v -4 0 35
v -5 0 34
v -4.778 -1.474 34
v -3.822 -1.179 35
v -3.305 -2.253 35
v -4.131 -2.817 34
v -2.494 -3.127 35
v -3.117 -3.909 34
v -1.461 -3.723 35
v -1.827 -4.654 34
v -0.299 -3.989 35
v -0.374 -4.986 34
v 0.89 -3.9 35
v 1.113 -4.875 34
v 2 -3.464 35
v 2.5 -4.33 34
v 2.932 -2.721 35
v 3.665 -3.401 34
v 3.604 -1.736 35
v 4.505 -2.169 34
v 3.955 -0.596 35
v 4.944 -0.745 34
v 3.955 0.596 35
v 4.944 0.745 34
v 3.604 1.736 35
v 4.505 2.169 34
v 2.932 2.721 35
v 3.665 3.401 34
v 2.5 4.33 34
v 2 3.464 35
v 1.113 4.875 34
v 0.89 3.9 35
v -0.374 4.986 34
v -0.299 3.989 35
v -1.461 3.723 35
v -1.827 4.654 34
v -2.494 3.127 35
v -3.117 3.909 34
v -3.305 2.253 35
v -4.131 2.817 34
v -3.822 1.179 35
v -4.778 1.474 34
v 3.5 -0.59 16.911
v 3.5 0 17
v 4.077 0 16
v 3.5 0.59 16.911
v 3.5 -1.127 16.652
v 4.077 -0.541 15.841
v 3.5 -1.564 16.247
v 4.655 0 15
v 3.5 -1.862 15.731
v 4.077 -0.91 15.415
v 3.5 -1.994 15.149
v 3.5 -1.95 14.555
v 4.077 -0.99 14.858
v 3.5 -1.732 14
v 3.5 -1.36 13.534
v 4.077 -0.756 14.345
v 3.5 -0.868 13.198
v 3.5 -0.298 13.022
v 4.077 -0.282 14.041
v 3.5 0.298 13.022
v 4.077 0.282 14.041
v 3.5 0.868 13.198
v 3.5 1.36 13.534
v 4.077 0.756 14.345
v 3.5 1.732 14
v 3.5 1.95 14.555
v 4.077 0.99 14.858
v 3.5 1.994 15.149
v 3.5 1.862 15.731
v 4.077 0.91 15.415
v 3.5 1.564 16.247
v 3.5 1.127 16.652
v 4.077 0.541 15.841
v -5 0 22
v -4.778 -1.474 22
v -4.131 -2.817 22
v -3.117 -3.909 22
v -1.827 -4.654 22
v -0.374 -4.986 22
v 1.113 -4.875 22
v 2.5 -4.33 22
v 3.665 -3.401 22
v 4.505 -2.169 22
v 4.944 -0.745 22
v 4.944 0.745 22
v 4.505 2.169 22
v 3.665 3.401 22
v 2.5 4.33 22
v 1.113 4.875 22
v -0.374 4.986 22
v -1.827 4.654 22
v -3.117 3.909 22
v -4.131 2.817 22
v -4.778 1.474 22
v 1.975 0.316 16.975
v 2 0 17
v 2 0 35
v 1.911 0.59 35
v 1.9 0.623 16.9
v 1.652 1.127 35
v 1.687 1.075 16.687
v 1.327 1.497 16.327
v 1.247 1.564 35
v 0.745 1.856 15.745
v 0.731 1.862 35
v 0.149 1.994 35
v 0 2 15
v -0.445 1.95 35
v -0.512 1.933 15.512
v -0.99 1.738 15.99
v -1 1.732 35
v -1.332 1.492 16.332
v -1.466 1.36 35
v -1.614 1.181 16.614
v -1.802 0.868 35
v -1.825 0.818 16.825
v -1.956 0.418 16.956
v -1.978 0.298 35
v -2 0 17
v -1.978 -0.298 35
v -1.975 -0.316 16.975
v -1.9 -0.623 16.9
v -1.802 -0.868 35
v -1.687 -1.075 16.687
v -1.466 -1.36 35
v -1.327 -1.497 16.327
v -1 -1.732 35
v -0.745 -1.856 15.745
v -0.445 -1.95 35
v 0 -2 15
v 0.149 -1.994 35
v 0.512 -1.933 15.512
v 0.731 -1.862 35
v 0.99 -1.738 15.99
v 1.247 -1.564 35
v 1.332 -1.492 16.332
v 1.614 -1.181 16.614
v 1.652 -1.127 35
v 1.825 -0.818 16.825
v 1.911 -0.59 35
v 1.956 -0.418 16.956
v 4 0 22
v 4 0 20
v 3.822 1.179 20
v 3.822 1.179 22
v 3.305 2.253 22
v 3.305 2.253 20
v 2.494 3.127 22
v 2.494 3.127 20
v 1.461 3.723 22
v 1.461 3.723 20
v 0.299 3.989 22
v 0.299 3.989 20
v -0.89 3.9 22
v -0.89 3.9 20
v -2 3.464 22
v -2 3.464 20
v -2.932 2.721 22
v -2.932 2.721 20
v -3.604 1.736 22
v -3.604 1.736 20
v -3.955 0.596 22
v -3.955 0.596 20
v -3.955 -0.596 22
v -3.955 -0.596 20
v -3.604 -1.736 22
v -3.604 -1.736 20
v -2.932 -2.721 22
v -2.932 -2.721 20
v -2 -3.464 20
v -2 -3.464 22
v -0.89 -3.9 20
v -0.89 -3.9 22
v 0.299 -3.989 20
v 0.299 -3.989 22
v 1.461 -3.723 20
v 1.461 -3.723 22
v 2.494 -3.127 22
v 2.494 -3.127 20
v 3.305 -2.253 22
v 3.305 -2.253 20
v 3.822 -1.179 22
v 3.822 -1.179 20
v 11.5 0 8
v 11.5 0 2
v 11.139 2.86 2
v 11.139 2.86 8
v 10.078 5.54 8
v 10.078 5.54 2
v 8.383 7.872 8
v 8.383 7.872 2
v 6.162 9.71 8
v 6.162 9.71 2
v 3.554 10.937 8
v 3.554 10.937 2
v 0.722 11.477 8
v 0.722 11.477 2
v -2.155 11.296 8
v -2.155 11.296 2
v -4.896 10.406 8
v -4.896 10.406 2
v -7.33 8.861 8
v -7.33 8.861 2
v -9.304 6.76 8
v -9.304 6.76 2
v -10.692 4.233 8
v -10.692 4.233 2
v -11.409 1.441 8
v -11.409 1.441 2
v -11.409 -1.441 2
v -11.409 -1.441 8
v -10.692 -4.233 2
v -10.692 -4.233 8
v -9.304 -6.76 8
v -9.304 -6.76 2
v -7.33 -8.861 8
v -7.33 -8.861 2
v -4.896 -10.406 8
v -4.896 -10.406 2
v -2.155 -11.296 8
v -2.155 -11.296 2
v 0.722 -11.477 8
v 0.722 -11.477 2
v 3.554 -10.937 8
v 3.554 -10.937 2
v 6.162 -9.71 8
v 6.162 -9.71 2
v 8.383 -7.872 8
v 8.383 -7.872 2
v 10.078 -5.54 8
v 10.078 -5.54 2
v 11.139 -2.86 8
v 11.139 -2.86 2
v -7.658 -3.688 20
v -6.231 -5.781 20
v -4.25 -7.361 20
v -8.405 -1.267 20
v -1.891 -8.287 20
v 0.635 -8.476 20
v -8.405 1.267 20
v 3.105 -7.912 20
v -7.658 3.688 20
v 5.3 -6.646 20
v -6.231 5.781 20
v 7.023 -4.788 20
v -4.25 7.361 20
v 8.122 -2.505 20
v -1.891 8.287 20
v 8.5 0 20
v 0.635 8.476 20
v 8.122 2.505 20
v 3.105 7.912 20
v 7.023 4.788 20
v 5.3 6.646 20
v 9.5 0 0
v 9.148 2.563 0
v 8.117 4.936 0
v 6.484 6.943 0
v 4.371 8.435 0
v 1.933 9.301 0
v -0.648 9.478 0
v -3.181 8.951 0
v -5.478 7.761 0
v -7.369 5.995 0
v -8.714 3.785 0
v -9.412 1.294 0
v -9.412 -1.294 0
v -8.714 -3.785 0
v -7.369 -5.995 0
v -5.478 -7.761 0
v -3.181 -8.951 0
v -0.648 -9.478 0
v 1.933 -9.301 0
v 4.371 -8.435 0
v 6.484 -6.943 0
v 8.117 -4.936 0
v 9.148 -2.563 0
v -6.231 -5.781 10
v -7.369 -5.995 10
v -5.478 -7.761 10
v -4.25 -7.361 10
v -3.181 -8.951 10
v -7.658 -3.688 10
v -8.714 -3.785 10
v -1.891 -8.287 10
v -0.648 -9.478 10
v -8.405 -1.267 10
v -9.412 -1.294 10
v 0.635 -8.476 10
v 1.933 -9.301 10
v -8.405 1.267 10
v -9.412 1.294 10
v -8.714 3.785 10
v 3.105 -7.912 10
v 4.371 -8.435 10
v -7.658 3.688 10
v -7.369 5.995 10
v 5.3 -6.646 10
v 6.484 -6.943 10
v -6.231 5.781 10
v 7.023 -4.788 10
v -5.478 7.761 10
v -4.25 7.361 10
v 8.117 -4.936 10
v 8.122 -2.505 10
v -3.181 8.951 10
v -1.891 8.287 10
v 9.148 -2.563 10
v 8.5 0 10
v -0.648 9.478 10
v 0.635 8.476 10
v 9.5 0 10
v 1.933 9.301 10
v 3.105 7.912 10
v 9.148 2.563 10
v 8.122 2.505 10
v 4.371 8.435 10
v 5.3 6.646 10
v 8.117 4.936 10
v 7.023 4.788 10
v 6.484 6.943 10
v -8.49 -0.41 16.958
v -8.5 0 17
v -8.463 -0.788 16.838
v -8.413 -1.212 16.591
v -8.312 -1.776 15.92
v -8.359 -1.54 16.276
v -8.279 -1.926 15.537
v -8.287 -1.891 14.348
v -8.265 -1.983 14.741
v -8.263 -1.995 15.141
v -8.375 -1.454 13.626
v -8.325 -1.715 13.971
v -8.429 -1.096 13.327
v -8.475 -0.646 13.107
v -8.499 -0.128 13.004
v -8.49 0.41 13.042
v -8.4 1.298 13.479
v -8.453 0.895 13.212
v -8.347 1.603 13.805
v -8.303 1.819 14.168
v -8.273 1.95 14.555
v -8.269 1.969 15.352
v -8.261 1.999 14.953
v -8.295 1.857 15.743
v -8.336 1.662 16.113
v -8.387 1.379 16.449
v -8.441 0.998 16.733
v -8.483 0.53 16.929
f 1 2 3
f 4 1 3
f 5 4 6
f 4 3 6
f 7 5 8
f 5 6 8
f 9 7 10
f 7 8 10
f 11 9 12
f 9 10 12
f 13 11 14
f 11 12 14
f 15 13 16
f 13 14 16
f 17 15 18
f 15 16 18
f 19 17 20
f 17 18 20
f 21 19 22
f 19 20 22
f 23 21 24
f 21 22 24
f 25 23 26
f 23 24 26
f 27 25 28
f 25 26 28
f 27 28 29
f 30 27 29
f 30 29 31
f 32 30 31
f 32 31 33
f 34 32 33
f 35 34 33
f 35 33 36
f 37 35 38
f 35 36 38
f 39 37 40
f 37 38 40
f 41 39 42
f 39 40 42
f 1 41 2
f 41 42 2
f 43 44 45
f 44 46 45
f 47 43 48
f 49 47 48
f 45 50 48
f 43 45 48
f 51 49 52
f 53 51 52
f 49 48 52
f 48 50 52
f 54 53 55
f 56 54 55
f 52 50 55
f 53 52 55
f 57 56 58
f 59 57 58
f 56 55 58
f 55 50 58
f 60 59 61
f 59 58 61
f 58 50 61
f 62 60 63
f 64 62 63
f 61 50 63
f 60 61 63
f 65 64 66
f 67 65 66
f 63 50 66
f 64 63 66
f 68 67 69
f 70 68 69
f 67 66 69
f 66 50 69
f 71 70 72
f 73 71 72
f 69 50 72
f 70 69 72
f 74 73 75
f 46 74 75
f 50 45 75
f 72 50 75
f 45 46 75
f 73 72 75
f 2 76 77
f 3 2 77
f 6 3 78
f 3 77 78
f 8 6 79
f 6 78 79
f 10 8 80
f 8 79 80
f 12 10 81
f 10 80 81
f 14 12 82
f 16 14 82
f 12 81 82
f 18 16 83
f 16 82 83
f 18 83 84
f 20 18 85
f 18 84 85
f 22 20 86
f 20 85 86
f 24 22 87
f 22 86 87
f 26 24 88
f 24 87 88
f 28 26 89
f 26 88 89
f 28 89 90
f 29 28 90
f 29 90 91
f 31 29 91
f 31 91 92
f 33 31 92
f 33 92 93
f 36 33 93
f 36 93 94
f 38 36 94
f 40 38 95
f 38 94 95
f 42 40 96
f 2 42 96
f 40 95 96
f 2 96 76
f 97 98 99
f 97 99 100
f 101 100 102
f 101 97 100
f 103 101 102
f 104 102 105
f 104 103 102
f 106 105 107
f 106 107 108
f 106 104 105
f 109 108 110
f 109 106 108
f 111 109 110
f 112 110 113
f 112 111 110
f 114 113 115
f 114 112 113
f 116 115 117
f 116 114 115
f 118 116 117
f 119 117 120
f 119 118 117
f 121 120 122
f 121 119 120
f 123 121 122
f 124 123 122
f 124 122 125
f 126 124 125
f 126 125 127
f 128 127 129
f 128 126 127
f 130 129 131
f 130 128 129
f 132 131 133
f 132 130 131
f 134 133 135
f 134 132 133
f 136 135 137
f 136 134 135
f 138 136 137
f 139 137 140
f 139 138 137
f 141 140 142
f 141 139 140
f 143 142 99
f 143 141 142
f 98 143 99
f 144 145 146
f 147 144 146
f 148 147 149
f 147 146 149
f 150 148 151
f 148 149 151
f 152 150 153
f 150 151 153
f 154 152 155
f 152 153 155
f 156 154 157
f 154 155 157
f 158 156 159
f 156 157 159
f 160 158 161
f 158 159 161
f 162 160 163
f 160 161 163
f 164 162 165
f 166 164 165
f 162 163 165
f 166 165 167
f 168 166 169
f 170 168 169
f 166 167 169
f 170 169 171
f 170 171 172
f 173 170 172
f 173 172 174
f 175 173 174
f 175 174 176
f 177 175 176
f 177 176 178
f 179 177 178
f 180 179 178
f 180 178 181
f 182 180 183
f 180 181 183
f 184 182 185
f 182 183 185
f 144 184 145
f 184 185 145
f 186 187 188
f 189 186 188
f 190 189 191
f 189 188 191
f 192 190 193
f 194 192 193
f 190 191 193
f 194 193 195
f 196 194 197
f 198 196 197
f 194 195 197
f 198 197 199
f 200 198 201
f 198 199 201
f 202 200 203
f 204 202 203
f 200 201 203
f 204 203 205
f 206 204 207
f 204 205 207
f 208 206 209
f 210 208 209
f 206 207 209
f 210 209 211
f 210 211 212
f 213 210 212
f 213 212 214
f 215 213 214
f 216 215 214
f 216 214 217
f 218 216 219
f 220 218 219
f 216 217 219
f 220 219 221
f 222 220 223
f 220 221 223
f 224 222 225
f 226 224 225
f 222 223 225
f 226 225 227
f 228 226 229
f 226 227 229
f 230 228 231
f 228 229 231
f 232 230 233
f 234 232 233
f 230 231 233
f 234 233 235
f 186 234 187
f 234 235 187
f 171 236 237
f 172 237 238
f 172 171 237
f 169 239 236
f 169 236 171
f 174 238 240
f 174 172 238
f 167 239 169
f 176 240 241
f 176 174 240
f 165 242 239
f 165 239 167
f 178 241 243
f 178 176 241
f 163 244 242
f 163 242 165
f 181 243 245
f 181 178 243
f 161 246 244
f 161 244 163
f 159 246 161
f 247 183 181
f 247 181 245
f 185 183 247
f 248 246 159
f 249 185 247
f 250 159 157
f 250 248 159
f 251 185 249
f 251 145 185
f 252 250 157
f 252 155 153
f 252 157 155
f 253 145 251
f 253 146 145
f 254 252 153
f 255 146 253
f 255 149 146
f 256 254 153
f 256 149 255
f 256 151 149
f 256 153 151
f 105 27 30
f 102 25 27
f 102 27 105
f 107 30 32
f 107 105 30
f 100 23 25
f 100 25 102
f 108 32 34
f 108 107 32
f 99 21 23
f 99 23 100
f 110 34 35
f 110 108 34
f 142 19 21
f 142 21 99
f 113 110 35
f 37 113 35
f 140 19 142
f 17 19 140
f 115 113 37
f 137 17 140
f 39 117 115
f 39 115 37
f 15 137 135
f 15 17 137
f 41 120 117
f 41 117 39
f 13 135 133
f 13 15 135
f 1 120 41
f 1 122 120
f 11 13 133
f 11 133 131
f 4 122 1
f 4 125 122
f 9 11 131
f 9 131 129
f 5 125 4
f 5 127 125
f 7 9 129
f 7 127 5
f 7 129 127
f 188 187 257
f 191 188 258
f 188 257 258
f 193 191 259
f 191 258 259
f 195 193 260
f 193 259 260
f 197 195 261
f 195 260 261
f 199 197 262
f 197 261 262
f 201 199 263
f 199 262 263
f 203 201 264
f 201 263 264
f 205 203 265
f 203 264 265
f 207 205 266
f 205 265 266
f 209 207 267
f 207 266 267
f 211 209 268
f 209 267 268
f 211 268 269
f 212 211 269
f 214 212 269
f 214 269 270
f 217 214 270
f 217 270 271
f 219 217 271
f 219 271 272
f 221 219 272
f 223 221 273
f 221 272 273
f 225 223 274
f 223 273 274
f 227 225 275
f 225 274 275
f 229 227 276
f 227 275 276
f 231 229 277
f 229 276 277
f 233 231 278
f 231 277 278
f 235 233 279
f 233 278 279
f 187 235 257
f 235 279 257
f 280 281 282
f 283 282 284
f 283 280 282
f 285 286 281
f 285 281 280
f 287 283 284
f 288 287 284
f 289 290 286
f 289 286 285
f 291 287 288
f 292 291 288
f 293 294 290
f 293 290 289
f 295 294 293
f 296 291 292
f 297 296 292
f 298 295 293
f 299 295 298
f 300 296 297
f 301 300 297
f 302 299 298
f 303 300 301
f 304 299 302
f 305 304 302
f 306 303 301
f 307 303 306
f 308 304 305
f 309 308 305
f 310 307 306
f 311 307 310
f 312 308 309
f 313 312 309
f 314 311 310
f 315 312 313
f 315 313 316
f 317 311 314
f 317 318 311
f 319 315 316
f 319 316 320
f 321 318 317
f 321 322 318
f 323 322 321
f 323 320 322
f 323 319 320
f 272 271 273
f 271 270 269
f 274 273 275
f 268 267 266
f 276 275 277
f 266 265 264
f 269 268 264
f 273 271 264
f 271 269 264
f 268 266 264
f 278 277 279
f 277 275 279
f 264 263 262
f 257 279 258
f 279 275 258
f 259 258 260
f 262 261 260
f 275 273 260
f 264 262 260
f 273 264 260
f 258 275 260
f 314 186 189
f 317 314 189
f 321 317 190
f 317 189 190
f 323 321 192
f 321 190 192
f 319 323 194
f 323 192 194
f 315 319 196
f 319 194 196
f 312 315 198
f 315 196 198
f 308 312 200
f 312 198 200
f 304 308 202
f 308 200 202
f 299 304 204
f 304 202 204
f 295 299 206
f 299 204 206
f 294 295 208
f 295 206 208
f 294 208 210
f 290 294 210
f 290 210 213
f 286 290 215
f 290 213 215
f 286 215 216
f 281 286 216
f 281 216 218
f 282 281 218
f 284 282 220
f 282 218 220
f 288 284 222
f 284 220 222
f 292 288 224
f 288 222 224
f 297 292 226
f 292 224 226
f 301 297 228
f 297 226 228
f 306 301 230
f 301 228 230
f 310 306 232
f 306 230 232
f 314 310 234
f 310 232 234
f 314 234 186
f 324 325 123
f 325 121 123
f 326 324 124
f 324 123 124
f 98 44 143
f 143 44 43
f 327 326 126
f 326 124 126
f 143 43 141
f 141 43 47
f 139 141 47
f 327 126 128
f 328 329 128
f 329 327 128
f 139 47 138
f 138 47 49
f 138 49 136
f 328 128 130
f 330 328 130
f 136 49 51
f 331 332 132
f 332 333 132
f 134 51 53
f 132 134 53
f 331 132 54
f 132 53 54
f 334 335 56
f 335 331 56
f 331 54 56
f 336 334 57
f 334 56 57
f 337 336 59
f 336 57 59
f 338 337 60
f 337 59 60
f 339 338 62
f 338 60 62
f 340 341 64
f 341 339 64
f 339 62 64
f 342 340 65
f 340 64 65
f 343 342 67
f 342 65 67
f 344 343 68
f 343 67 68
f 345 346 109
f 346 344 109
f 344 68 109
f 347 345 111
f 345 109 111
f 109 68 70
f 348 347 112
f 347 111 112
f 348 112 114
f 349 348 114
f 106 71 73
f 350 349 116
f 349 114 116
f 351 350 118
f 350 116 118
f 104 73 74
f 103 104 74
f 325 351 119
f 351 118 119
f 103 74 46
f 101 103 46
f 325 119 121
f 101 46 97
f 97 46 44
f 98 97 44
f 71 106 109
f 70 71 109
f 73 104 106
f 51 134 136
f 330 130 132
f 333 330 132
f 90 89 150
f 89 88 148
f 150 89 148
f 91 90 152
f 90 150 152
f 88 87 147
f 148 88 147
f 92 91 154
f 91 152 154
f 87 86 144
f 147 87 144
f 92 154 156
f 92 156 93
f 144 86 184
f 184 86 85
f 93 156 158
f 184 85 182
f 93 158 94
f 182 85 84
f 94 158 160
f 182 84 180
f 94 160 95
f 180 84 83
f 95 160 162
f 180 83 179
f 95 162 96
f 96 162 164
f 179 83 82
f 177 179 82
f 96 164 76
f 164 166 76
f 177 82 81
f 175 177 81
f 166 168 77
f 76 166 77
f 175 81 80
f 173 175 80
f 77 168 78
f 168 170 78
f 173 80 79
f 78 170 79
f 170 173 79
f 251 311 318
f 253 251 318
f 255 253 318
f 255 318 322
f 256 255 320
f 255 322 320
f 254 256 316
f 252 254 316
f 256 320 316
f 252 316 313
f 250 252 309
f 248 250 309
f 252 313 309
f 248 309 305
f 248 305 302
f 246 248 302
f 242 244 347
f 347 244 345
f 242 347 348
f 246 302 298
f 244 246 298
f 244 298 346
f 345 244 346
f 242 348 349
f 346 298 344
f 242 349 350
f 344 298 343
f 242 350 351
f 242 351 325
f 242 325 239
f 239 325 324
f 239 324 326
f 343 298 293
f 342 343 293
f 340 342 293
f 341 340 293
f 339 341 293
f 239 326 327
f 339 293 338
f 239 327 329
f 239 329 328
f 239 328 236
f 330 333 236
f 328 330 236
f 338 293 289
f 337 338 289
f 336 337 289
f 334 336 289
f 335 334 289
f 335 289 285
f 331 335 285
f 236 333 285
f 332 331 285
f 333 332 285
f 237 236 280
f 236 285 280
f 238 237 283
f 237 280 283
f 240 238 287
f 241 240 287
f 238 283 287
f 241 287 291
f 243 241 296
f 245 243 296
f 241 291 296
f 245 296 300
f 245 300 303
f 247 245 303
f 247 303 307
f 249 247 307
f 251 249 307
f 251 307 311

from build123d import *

# Parameters (mm, degrees)
SKETCH_1_R      = 11.5
EXTRUDE_1_DEPTH = 10
SKETCH_2_R      = 8.5
EXTRUDE_2_DEPTH = 10
SKETCH_3_R      = 4
EXTRUDE_3_DEPTH = 2
SKETCH_4_R      = 5
EXTRUDE_4_DEPTH = 13
CHAMFER_1_SIZE  = 2
CHAMFER_2_SIZE  = 1


with BuildPart() as part:
    # 草图1 → 拉伸1 (new body)
    with BuildSketch(Plane.XY):
        Circle(SKETCH_1_R)
    extrude(amount=EXTRUDE_1_DEPTH)

    # 草图2 → 拉伸2 (add)
    with BuildSketch(Plane.XY.offset(10)):
        Circle(SKETCH_2_R)
    extrude(amount=EXTRUDE_2_DEPTH)

    # 草图3 → 拉伸3 (add)
    with BuildSketch(Plane.XY.offset(20)):
        Circle(SKETCH_3_R)
    extrude(amount=EXTRUDE_3_DEPTH)

    # 草图4 → 拉伸4 (add)
    with BuildSketch(Plane.XY.offset(22)):
        with Locations(Location((0, 0, 0), (0, 0, 180))):
            Circle(SKETCH_4_R)
    extrude(amount=EXTRUDE_4_DEPTH)

    # 草图6 → 切除-旋转1 (revolve, cut)
    with BuildSketch(Plane(origin=(0, 0, 0), x_dir=(1, 0, 0), z_dir=(0, 1, 0))):
        Polygon((0, -35), (2, -35), (2, -15), (0, -13.845299462), align=None)
    revolve(axis=Axis((0, 0, 2.170078688), (0, 0, 1)), mode=Mode.SUBTRACT)

    # 草图7 → 切除-旋转2 (revolve, cut)
    with BuildSketch(Plane(origin=(0, 0, 0), x_dir=(1, 0, 0), z_dir=(0, 1, 0))):
        Polygon((-8.5, -15), (-8.5, -17), (3.5, -17), (4.654700538, -15), align=None)
    revolve(axis=Axis((-16.340863748, 0, 15), (1, 0, 0)), mode=Mode.SUBTRACT)

    # 倒角1
    chamfer_1_edges = [part.edges().sort_by_distance(p)[0] for p in [
        (-11.5, 0, 0),
        (-11.5, 0, 10),
    ]]
    chamfer(chamfer_1_edges, length=CHAMFER_1_SIZE)

    # 倒角2
    chamfer_2_edges = [part.edges().sort_by_distance(p)[0] for p in [
        (5, 0, 35),
    ]]
    chamfer(chamfer_2_edges, length=CHAMFER_2_SIZE)


solid = part.part
